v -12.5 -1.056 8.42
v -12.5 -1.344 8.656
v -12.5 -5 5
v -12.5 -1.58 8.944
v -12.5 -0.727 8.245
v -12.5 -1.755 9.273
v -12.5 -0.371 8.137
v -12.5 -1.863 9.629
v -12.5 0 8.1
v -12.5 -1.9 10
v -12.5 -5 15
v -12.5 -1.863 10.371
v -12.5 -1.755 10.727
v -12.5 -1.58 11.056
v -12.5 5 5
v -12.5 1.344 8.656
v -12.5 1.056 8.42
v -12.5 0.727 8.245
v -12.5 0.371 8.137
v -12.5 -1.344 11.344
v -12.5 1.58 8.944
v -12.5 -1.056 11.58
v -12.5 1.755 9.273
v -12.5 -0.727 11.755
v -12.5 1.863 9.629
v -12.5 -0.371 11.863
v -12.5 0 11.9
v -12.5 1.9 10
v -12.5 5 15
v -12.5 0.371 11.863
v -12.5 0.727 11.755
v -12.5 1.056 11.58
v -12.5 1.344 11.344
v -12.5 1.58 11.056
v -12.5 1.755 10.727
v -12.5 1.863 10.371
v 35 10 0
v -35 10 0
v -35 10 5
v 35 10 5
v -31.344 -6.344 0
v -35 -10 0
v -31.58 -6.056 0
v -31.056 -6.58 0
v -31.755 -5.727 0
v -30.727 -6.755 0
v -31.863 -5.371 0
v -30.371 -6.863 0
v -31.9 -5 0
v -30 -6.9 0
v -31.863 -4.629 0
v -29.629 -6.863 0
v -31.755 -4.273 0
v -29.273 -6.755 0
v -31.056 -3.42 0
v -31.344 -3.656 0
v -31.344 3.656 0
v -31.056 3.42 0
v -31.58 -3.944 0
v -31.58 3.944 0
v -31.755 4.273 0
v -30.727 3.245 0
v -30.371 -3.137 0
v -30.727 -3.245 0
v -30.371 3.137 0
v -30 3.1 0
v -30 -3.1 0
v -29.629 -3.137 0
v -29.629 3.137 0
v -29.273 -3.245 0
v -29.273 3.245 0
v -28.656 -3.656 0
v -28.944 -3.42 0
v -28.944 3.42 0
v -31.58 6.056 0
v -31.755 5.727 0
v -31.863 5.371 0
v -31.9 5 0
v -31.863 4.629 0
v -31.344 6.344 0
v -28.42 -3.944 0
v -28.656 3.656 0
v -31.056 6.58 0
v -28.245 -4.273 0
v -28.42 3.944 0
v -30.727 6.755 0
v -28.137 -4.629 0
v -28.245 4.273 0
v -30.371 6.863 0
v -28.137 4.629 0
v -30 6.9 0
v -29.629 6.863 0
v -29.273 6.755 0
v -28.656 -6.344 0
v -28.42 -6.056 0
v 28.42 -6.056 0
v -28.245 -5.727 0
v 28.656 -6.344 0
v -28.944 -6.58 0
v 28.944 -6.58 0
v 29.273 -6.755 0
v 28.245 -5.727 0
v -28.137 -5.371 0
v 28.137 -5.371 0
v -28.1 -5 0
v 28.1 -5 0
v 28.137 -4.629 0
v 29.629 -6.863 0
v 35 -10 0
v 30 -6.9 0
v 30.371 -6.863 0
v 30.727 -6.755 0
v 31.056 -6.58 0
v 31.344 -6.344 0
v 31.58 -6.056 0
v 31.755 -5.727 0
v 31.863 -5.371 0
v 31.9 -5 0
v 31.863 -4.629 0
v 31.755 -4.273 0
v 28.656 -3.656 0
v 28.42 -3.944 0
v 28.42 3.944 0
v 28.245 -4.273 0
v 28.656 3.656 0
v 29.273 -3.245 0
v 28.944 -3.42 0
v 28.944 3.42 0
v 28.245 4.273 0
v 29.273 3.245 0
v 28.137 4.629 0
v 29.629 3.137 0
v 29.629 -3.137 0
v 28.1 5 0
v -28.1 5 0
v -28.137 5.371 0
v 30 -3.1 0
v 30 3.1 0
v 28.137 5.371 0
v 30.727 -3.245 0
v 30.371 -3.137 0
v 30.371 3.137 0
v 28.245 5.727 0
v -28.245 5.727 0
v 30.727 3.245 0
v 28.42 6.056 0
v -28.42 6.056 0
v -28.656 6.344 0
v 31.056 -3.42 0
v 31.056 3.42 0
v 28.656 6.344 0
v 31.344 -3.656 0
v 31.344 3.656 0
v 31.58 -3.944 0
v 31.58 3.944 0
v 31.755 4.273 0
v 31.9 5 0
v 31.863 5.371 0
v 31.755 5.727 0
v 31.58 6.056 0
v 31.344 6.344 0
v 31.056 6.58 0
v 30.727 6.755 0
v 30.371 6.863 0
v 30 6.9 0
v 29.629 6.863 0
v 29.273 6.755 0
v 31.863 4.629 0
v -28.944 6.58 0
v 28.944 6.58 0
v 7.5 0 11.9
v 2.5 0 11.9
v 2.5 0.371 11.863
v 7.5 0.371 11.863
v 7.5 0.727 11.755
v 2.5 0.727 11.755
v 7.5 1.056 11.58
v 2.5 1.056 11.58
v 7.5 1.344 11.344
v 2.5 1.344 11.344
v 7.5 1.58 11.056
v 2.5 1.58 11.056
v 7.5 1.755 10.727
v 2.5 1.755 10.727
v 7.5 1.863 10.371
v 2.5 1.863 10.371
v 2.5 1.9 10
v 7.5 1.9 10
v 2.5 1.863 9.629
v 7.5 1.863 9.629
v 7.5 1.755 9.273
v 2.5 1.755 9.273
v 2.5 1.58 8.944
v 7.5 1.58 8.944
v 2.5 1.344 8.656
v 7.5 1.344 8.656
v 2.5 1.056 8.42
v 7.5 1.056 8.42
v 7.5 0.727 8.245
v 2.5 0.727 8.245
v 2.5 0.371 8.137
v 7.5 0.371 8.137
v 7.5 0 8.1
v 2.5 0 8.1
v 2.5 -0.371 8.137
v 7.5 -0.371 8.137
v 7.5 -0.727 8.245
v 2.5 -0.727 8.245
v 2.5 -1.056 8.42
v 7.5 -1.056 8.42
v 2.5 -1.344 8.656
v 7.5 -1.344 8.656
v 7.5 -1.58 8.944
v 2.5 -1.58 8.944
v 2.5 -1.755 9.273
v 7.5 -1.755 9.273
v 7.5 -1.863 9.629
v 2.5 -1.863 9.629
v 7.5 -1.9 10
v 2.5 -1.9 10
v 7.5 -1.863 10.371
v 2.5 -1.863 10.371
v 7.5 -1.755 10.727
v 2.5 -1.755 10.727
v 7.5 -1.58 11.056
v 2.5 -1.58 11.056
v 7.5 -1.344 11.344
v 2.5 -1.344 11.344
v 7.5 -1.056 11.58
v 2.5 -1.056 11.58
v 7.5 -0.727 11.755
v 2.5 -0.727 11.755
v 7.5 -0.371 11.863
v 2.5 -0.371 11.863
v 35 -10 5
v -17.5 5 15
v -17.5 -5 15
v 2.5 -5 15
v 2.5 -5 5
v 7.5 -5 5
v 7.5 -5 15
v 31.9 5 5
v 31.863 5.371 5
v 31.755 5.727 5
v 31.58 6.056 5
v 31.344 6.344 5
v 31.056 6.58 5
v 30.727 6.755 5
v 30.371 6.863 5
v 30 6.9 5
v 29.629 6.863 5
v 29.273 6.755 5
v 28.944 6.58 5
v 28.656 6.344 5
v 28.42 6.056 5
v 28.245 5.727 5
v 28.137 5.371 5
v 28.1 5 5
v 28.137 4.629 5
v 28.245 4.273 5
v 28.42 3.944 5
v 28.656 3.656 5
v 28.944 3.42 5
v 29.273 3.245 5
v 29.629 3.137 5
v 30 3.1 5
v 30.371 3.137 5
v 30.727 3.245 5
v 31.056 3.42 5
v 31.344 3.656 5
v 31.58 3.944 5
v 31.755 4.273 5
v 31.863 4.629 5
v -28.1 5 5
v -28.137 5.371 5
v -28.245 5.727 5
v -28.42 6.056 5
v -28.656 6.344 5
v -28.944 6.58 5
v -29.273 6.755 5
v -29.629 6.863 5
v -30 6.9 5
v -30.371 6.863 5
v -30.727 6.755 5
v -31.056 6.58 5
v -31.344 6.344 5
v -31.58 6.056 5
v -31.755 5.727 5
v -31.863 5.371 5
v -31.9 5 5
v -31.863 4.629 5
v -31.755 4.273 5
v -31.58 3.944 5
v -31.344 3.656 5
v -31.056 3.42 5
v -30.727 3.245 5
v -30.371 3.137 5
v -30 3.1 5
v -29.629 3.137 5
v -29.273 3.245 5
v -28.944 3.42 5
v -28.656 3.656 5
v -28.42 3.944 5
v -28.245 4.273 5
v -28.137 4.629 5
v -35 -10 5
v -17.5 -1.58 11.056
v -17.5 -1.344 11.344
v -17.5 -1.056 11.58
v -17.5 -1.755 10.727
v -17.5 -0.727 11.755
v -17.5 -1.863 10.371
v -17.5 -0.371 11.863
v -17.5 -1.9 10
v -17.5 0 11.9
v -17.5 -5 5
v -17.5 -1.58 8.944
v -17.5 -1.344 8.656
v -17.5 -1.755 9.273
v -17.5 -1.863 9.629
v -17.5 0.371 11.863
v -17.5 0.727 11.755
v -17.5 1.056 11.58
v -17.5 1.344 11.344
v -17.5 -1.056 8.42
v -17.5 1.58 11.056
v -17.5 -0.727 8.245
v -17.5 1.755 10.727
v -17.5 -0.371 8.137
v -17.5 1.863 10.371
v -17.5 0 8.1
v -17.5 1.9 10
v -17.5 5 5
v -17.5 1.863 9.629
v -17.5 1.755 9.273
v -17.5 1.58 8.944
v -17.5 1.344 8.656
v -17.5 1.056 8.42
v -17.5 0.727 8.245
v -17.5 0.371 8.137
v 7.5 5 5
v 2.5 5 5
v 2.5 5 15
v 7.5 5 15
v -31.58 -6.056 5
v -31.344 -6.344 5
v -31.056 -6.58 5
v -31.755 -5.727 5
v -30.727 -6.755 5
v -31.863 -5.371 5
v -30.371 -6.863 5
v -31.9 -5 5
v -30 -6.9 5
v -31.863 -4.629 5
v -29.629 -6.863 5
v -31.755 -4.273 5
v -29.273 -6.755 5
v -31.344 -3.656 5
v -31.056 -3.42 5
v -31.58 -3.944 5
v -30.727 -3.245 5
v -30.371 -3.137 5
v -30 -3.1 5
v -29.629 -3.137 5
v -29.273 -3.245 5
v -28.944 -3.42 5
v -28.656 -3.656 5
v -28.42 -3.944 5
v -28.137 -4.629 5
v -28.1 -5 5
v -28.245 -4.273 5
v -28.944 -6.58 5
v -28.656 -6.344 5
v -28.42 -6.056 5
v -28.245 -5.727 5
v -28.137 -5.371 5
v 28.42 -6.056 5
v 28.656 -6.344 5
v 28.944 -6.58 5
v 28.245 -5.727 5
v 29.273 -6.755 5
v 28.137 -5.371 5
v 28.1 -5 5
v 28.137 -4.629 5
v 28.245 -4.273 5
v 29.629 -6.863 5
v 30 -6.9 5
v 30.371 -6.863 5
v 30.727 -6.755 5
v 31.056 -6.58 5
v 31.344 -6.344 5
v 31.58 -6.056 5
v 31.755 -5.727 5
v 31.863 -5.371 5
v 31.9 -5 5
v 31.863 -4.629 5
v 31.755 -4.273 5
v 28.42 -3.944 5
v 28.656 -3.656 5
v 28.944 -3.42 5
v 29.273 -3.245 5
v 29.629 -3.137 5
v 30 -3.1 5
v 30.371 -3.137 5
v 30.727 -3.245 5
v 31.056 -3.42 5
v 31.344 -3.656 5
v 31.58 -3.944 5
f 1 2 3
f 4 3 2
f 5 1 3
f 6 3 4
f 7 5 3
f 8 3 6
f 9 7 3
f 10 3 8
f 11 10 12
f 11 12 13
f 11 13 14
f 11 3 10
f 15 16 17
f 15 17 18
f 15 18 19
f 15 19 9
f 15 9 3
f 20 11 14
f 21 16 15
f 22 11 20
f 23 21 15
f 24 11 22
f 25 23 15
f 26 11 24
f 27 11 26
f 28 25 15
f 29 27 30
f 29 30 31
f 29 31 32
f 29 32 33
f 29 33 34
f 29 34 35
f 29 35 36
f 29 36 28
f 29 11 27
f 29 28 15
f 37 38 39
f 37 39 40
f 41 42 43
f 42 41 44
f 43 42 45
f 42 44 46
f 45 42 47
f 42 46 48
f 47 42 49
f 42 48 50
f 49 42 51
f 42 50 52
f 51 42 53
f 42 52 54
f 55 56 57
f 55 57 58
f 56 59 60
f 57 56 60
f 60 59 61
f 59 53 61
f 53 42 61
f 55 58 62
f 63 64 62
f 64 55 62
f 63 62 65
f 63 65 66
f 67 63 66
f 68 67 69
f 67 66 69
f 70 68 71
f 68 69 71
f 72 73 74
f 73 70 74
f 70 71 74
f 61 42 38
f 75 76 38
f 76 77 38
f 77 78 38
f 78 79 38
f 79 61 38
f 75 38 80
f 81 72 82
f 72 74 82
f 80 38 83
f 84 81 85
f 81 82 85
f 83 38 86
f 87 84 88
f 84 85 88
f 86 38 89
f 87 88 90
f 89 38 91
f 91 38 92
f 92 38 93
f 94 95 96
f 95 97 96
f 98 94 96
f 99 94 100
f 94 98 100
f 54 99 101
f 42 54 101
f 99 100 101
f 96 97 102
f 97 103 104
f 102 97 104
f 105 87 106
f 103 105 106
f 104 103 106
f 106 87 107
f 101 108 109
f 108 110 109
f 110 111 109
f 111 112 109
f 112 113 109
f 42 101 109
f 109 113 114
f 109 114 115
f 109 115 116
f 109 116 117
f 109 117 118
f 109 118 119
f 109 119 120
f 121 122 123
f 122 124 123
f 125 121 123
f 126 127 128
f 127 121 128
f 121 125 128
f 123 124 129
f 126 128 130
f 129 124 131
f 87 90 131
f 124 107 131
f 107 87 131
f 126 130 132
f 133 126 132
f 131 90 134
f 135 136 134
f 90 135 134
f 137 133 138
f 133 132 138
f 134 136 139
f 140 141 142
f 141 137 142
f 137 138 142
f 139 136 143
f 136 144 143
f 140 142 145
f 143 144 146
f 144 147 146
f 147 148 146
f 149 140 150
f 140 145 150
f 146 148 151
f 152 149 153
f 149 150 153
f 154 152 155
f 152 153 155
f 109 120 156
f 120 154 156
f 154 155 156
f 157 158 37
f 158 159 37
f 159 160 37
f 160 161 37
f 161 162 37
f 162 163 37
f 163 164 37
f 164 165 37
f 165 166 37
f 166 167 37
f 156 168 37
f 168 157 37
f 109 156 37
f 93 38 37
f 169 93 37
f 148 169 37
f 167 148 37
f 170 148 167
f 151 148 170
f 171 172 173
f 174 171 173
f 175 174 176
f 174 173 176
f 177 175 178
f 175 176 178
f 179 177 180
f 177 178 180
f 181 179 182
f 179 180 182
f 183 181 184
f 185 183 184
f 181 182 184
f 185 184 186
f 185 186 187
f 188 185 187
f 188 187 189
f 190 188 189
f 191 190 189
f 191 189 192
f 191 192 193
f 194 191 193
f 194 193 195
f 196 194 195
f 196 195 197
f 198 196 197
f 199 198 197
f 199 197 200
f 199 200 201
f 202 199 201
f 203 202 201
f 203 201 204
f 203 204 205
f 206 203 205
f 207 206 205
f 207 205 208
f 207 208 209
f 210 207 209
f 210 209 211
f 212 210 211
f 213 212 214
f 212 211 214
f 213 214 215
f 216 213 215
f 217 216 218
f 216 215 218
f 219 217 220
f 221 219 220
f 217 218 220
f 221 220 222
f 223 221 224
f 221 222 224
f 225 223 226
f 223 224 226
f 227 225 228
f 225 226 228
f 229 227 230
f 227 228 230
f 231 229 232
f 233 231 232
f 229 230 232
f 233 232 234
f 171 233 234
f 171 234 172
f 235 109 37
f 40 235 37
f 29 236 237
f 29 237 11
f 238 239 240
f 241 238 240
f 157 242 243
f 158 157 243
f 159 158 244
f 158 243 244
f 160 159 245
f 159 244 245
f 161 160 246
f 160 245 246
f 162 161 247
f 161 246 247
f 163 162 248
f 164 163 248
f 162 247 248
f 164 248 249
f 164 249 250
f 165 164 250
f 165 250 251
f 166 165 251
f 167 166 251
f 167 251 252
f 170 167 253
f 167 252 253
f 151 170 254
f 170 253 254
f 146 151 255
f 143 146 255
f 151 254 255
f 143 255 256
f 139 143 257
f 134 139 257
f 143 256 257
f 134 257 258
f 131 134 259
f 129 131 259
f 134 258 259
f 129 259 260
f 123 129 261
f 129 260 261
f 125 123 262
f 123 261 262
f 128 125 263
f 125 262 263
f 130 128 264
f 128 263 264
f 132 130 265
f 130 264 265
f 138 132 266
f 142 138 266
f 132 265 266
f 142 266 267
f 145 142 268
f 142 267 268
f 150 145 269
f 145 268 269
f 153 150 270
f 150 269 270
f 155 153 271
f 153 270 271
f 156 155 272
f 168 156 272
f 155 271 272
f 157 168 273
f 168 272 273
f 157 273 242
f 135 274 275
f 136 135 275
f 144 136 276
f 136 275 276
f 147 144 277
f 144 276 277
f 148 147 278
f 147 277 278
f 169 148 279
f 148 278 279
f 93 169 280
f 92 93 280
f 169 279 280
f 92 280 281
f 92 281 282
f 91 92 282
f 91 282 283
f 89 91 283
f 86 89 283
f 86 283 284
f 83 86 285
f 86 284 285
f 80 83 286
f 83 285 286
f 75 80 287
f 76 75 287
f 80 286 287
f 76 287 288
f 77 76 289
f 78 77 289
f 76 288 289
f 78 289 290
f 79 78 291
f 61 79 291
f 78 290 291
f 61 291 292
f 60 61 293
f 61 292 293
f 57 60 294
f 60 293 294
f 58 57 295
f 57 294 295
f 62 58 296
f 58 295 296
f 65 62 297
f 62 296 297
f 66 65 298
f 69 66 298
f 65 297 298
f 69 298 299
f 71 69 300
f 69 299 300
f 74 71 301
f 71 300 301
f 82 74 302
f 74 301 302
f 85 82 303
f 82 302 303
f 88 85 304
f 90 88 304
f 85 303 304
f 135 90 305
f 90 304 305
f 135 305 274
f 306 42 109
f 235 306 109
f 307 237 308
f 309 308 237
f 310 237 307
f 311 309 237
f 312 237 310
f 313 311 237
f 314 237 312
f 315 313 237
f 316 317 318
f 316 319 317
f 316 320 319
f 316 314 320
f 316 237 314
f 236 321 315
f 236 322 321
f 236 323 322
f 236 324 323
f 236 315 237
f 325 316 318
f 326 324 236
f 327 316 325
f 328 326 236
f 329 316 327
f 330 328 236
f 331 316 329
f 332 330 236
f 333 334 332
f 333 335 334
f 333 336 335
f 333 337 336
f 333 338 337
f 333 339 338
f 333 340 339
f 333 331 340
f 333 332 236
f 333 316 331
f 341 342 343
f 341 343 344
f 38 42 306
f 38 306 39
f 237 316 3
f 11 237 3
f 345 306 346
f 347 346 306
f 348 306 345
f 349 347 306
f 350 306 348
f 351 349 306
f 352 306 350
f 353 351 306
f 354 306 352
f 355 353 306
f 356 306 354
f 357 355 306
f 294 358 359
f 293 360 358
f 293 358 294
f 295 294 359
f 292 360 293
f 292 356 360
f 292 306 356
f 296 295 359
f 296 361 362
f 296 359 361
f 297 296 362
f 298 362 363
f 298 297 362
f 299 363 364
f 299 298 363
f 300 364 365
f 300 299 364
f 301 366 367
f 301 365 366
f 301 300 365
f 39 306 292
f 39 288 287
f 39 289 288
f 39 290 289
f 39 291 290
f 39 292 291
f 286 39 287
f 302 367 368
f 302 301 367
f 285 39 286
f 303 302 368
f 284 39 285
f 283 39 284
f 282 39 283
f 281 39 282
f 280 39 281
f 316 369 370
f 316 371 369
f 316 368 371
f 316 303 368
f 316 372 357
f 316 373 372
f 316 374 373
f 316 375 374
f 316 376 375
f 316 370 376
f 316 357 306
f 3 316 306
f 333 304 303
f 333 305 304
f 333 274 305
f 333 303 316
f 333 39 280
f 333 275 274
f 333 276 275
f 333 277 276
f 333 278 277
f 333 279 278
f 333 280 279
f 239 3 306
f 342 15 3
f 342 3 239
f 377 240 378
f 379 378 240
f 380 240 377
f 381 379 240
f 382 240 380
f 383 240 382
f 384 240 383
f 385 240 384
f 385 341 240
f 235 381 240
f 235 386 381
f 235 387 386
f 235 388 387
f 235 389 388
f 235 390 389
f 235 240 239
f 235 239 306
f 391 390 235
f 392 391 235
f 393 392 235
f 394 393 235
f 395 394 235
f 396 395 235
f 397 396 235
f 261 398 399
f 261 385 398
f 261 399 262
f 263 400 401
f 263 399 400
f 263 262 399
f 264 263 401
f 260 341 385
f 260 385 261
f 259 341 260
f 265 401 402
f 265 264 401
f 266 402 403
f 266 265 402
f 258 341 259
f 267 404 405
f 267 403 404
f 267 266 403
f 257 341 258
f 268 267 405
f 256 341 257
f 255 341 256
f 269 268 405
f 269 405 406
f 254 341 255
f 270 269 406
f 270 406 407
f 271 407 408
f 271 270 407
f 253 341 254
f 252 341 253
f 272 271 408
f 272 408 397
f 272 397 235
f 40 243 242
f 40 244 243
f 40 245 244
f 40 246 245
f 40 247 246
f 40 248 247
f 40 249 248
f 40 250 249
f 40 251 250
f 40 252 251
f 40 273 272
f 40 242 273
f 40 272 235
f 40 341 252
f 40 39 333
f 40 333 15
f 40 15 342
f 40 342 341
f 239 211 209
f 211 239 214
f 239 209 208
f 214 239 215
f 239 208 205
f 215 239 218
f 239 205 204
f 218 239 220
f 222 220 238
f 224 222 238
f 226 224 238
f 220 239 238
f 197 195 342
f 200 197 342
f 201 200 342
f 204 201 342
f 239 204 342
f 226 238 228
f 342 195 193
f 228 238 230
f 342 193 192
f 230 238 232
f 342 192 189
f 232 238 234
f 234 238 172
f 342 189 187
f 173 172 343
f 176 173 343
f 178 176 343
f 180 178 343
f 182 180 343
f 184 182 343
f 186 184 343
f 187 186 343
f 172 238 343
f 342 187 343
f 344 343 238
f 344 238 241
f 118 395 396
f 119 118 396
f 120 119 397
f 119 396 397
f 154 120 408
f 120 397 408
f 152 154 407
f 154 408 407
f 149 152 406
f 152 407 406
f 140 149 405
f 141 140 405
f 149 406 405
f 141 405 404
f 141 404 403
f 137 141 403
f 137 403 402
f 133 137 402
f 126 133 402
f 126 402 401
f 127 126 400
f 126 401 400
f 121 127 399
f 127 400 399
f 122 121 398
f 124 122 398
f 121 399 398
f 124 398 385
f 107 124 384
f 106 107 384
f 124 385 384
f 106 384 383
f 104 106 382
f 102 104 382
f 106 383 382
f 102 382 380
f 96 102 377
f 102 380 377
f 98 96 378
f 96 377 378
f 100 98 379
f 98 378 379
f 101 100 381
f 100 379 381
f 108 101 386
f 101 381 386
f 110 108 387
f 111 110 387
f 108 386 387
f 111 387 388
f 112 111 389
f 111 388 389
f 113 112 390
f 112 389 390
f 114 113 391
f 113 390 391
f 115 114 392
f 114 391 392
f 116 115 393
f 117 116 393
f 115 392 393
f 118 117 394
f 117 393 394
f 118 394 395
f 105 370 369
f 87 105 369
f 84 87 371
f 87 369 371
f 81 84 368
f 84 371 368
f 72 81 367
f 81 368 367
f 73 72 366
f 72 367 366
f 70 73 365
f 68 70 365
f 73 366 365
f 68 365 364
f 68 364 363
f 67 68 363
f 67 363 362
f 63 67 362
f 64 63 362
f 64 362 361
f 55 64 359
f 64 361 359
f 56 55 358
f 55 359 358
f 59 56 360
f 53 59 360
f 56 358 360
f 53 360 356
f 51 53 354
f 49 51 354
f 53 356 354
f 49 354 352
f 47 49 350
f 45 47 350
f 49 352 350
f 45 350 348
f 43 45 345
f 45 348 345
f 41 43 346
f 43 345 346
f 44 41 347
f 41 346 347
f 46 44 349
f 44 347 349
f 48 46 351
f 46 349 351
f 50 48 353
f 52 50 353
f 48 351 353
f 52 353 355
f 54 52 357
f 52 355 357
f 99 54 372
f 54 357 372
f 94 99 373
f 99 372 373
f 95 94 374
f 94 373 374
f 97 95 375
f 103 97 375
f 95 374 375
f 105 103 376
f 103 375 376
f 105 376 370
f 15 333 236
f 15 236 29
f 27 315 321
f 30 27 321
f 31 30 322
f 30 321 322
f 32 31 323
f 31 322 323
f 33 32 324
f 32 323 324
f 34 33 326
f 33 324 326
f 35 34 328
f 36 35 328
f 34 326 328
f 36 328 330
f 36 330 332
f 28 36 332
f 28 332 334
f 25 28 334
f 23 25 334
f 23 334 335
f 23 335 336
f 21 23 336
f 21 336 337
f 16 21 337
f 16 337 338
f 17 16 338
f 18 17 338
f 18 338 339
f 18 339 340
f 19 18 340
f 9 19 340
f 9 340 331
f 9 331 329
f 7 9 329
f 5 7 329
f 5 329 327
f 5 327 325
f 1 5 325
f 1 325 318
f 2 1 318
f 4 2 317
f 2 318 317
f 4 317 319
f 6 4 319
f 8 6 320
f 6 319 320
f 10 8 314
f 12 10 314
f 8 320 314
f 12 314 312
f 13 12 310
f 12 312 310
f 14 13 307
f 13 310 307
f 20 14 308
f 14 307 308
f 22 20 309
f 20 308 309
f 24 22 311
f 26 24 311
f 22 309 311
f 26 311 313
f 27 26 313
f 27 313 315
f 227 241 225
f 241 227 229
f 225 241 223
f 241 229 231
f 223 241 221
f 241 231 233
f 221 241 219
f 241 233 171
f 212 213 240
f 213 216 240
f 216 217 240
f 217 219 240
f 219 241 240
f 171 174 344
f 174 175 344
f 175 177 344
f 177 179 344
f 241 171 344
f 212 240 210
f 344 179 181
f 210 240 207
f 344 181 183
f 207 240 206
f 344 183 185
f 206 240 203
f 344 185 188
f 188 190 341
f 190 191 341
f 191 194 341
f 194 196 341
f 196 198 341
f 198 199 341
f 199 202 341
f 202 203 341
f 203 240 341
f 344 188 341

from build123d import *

# Parameters (mm, degrees)
SKETCH_1_W          = 70
SKETCH_1_H          = 20
EXTRUDE_1_DEPTH     = 5
SKETCH_2_R          = 1.9
CUT_EXTRUDE_1_DEPTH = 5
SKETCH_3_W          = 25
SKETCH_3_H          = 10
EXTRUDE_2_DEPTH     = 10
SKETCH_4_W          = 15
SKETCH_4_H          = 10
CUT_EXTRUDE_2_DEPTH = 10
SKETCH_5_R          = 1.9
CUT_EXTRUDE_3_DEPTH = 56.509008278


with BuildPart() as part:
    # ｽｹｯﾁ1 → ﾎﾞｽ - 押し出し1 (new body)
    with BuildSketch(Plane.XY):
        Rectangle(SKETCH_1_W, SKETCH_1_H)
    extrude(amount=EXTRUDE_1_DEPTH)

    # ｽｹｯﾁ2 → ｶｯﾄ - 押し出し1 (cut)
    with BuildSketch(Plane.XY.offset(5)):
        with Locations((-30, 5)):
            Circle(SKETCH_2_R)
        with Locations((-30, -5)):
            Circle(SKETCH_2_R)
        with Locations((30, 5)):
            Circle(SKETCH_2_R)
        with Locations((30, -5)):
            Circle(SKETCH_2_R)
    extrude(amount=-CUT_EXTRUDE_1_DEPTH, mode=Mode.SUBTRACT)

    # ｽｹｯﾁ3 → ﾎﾞｽ - 押し出し2 (add)
    with BuildSketch(Plane.XY.offset(5)):
        with Locations((-5, 0)):
            Rectangle(SKETCH_3_W, SKETCH_3_H)
    extrude(amount=EXTRUDE_2_DEPTH)

    # ｽｹｯﾁ4 → ｶｯﾄ - 押し出し2 (cut)
    with BuildSketch(Plane.XY.offset(15)):
        with Locations((-5, 0)):
            Rectangle(SKETCH_4_W, SKETCH_4_H)
    extrude(amount=-CUT_EXTRUDE_2_DEPTH, mode=Mode.SUBTRACT)

    # ｽｹｯﾁ5 → ｶｯﾄ - 押し出し3 (cut, through all)
    with BuildSketch(Plane.ZY.offset(17.5)):
        with Locations((10, 0)):
            Circle(SKETCH_5_R)
    extrude(amount=-CUT_EXTRUDE_3_DEPTH, mode=Mode.SUBTRACT)


solid = part.part
